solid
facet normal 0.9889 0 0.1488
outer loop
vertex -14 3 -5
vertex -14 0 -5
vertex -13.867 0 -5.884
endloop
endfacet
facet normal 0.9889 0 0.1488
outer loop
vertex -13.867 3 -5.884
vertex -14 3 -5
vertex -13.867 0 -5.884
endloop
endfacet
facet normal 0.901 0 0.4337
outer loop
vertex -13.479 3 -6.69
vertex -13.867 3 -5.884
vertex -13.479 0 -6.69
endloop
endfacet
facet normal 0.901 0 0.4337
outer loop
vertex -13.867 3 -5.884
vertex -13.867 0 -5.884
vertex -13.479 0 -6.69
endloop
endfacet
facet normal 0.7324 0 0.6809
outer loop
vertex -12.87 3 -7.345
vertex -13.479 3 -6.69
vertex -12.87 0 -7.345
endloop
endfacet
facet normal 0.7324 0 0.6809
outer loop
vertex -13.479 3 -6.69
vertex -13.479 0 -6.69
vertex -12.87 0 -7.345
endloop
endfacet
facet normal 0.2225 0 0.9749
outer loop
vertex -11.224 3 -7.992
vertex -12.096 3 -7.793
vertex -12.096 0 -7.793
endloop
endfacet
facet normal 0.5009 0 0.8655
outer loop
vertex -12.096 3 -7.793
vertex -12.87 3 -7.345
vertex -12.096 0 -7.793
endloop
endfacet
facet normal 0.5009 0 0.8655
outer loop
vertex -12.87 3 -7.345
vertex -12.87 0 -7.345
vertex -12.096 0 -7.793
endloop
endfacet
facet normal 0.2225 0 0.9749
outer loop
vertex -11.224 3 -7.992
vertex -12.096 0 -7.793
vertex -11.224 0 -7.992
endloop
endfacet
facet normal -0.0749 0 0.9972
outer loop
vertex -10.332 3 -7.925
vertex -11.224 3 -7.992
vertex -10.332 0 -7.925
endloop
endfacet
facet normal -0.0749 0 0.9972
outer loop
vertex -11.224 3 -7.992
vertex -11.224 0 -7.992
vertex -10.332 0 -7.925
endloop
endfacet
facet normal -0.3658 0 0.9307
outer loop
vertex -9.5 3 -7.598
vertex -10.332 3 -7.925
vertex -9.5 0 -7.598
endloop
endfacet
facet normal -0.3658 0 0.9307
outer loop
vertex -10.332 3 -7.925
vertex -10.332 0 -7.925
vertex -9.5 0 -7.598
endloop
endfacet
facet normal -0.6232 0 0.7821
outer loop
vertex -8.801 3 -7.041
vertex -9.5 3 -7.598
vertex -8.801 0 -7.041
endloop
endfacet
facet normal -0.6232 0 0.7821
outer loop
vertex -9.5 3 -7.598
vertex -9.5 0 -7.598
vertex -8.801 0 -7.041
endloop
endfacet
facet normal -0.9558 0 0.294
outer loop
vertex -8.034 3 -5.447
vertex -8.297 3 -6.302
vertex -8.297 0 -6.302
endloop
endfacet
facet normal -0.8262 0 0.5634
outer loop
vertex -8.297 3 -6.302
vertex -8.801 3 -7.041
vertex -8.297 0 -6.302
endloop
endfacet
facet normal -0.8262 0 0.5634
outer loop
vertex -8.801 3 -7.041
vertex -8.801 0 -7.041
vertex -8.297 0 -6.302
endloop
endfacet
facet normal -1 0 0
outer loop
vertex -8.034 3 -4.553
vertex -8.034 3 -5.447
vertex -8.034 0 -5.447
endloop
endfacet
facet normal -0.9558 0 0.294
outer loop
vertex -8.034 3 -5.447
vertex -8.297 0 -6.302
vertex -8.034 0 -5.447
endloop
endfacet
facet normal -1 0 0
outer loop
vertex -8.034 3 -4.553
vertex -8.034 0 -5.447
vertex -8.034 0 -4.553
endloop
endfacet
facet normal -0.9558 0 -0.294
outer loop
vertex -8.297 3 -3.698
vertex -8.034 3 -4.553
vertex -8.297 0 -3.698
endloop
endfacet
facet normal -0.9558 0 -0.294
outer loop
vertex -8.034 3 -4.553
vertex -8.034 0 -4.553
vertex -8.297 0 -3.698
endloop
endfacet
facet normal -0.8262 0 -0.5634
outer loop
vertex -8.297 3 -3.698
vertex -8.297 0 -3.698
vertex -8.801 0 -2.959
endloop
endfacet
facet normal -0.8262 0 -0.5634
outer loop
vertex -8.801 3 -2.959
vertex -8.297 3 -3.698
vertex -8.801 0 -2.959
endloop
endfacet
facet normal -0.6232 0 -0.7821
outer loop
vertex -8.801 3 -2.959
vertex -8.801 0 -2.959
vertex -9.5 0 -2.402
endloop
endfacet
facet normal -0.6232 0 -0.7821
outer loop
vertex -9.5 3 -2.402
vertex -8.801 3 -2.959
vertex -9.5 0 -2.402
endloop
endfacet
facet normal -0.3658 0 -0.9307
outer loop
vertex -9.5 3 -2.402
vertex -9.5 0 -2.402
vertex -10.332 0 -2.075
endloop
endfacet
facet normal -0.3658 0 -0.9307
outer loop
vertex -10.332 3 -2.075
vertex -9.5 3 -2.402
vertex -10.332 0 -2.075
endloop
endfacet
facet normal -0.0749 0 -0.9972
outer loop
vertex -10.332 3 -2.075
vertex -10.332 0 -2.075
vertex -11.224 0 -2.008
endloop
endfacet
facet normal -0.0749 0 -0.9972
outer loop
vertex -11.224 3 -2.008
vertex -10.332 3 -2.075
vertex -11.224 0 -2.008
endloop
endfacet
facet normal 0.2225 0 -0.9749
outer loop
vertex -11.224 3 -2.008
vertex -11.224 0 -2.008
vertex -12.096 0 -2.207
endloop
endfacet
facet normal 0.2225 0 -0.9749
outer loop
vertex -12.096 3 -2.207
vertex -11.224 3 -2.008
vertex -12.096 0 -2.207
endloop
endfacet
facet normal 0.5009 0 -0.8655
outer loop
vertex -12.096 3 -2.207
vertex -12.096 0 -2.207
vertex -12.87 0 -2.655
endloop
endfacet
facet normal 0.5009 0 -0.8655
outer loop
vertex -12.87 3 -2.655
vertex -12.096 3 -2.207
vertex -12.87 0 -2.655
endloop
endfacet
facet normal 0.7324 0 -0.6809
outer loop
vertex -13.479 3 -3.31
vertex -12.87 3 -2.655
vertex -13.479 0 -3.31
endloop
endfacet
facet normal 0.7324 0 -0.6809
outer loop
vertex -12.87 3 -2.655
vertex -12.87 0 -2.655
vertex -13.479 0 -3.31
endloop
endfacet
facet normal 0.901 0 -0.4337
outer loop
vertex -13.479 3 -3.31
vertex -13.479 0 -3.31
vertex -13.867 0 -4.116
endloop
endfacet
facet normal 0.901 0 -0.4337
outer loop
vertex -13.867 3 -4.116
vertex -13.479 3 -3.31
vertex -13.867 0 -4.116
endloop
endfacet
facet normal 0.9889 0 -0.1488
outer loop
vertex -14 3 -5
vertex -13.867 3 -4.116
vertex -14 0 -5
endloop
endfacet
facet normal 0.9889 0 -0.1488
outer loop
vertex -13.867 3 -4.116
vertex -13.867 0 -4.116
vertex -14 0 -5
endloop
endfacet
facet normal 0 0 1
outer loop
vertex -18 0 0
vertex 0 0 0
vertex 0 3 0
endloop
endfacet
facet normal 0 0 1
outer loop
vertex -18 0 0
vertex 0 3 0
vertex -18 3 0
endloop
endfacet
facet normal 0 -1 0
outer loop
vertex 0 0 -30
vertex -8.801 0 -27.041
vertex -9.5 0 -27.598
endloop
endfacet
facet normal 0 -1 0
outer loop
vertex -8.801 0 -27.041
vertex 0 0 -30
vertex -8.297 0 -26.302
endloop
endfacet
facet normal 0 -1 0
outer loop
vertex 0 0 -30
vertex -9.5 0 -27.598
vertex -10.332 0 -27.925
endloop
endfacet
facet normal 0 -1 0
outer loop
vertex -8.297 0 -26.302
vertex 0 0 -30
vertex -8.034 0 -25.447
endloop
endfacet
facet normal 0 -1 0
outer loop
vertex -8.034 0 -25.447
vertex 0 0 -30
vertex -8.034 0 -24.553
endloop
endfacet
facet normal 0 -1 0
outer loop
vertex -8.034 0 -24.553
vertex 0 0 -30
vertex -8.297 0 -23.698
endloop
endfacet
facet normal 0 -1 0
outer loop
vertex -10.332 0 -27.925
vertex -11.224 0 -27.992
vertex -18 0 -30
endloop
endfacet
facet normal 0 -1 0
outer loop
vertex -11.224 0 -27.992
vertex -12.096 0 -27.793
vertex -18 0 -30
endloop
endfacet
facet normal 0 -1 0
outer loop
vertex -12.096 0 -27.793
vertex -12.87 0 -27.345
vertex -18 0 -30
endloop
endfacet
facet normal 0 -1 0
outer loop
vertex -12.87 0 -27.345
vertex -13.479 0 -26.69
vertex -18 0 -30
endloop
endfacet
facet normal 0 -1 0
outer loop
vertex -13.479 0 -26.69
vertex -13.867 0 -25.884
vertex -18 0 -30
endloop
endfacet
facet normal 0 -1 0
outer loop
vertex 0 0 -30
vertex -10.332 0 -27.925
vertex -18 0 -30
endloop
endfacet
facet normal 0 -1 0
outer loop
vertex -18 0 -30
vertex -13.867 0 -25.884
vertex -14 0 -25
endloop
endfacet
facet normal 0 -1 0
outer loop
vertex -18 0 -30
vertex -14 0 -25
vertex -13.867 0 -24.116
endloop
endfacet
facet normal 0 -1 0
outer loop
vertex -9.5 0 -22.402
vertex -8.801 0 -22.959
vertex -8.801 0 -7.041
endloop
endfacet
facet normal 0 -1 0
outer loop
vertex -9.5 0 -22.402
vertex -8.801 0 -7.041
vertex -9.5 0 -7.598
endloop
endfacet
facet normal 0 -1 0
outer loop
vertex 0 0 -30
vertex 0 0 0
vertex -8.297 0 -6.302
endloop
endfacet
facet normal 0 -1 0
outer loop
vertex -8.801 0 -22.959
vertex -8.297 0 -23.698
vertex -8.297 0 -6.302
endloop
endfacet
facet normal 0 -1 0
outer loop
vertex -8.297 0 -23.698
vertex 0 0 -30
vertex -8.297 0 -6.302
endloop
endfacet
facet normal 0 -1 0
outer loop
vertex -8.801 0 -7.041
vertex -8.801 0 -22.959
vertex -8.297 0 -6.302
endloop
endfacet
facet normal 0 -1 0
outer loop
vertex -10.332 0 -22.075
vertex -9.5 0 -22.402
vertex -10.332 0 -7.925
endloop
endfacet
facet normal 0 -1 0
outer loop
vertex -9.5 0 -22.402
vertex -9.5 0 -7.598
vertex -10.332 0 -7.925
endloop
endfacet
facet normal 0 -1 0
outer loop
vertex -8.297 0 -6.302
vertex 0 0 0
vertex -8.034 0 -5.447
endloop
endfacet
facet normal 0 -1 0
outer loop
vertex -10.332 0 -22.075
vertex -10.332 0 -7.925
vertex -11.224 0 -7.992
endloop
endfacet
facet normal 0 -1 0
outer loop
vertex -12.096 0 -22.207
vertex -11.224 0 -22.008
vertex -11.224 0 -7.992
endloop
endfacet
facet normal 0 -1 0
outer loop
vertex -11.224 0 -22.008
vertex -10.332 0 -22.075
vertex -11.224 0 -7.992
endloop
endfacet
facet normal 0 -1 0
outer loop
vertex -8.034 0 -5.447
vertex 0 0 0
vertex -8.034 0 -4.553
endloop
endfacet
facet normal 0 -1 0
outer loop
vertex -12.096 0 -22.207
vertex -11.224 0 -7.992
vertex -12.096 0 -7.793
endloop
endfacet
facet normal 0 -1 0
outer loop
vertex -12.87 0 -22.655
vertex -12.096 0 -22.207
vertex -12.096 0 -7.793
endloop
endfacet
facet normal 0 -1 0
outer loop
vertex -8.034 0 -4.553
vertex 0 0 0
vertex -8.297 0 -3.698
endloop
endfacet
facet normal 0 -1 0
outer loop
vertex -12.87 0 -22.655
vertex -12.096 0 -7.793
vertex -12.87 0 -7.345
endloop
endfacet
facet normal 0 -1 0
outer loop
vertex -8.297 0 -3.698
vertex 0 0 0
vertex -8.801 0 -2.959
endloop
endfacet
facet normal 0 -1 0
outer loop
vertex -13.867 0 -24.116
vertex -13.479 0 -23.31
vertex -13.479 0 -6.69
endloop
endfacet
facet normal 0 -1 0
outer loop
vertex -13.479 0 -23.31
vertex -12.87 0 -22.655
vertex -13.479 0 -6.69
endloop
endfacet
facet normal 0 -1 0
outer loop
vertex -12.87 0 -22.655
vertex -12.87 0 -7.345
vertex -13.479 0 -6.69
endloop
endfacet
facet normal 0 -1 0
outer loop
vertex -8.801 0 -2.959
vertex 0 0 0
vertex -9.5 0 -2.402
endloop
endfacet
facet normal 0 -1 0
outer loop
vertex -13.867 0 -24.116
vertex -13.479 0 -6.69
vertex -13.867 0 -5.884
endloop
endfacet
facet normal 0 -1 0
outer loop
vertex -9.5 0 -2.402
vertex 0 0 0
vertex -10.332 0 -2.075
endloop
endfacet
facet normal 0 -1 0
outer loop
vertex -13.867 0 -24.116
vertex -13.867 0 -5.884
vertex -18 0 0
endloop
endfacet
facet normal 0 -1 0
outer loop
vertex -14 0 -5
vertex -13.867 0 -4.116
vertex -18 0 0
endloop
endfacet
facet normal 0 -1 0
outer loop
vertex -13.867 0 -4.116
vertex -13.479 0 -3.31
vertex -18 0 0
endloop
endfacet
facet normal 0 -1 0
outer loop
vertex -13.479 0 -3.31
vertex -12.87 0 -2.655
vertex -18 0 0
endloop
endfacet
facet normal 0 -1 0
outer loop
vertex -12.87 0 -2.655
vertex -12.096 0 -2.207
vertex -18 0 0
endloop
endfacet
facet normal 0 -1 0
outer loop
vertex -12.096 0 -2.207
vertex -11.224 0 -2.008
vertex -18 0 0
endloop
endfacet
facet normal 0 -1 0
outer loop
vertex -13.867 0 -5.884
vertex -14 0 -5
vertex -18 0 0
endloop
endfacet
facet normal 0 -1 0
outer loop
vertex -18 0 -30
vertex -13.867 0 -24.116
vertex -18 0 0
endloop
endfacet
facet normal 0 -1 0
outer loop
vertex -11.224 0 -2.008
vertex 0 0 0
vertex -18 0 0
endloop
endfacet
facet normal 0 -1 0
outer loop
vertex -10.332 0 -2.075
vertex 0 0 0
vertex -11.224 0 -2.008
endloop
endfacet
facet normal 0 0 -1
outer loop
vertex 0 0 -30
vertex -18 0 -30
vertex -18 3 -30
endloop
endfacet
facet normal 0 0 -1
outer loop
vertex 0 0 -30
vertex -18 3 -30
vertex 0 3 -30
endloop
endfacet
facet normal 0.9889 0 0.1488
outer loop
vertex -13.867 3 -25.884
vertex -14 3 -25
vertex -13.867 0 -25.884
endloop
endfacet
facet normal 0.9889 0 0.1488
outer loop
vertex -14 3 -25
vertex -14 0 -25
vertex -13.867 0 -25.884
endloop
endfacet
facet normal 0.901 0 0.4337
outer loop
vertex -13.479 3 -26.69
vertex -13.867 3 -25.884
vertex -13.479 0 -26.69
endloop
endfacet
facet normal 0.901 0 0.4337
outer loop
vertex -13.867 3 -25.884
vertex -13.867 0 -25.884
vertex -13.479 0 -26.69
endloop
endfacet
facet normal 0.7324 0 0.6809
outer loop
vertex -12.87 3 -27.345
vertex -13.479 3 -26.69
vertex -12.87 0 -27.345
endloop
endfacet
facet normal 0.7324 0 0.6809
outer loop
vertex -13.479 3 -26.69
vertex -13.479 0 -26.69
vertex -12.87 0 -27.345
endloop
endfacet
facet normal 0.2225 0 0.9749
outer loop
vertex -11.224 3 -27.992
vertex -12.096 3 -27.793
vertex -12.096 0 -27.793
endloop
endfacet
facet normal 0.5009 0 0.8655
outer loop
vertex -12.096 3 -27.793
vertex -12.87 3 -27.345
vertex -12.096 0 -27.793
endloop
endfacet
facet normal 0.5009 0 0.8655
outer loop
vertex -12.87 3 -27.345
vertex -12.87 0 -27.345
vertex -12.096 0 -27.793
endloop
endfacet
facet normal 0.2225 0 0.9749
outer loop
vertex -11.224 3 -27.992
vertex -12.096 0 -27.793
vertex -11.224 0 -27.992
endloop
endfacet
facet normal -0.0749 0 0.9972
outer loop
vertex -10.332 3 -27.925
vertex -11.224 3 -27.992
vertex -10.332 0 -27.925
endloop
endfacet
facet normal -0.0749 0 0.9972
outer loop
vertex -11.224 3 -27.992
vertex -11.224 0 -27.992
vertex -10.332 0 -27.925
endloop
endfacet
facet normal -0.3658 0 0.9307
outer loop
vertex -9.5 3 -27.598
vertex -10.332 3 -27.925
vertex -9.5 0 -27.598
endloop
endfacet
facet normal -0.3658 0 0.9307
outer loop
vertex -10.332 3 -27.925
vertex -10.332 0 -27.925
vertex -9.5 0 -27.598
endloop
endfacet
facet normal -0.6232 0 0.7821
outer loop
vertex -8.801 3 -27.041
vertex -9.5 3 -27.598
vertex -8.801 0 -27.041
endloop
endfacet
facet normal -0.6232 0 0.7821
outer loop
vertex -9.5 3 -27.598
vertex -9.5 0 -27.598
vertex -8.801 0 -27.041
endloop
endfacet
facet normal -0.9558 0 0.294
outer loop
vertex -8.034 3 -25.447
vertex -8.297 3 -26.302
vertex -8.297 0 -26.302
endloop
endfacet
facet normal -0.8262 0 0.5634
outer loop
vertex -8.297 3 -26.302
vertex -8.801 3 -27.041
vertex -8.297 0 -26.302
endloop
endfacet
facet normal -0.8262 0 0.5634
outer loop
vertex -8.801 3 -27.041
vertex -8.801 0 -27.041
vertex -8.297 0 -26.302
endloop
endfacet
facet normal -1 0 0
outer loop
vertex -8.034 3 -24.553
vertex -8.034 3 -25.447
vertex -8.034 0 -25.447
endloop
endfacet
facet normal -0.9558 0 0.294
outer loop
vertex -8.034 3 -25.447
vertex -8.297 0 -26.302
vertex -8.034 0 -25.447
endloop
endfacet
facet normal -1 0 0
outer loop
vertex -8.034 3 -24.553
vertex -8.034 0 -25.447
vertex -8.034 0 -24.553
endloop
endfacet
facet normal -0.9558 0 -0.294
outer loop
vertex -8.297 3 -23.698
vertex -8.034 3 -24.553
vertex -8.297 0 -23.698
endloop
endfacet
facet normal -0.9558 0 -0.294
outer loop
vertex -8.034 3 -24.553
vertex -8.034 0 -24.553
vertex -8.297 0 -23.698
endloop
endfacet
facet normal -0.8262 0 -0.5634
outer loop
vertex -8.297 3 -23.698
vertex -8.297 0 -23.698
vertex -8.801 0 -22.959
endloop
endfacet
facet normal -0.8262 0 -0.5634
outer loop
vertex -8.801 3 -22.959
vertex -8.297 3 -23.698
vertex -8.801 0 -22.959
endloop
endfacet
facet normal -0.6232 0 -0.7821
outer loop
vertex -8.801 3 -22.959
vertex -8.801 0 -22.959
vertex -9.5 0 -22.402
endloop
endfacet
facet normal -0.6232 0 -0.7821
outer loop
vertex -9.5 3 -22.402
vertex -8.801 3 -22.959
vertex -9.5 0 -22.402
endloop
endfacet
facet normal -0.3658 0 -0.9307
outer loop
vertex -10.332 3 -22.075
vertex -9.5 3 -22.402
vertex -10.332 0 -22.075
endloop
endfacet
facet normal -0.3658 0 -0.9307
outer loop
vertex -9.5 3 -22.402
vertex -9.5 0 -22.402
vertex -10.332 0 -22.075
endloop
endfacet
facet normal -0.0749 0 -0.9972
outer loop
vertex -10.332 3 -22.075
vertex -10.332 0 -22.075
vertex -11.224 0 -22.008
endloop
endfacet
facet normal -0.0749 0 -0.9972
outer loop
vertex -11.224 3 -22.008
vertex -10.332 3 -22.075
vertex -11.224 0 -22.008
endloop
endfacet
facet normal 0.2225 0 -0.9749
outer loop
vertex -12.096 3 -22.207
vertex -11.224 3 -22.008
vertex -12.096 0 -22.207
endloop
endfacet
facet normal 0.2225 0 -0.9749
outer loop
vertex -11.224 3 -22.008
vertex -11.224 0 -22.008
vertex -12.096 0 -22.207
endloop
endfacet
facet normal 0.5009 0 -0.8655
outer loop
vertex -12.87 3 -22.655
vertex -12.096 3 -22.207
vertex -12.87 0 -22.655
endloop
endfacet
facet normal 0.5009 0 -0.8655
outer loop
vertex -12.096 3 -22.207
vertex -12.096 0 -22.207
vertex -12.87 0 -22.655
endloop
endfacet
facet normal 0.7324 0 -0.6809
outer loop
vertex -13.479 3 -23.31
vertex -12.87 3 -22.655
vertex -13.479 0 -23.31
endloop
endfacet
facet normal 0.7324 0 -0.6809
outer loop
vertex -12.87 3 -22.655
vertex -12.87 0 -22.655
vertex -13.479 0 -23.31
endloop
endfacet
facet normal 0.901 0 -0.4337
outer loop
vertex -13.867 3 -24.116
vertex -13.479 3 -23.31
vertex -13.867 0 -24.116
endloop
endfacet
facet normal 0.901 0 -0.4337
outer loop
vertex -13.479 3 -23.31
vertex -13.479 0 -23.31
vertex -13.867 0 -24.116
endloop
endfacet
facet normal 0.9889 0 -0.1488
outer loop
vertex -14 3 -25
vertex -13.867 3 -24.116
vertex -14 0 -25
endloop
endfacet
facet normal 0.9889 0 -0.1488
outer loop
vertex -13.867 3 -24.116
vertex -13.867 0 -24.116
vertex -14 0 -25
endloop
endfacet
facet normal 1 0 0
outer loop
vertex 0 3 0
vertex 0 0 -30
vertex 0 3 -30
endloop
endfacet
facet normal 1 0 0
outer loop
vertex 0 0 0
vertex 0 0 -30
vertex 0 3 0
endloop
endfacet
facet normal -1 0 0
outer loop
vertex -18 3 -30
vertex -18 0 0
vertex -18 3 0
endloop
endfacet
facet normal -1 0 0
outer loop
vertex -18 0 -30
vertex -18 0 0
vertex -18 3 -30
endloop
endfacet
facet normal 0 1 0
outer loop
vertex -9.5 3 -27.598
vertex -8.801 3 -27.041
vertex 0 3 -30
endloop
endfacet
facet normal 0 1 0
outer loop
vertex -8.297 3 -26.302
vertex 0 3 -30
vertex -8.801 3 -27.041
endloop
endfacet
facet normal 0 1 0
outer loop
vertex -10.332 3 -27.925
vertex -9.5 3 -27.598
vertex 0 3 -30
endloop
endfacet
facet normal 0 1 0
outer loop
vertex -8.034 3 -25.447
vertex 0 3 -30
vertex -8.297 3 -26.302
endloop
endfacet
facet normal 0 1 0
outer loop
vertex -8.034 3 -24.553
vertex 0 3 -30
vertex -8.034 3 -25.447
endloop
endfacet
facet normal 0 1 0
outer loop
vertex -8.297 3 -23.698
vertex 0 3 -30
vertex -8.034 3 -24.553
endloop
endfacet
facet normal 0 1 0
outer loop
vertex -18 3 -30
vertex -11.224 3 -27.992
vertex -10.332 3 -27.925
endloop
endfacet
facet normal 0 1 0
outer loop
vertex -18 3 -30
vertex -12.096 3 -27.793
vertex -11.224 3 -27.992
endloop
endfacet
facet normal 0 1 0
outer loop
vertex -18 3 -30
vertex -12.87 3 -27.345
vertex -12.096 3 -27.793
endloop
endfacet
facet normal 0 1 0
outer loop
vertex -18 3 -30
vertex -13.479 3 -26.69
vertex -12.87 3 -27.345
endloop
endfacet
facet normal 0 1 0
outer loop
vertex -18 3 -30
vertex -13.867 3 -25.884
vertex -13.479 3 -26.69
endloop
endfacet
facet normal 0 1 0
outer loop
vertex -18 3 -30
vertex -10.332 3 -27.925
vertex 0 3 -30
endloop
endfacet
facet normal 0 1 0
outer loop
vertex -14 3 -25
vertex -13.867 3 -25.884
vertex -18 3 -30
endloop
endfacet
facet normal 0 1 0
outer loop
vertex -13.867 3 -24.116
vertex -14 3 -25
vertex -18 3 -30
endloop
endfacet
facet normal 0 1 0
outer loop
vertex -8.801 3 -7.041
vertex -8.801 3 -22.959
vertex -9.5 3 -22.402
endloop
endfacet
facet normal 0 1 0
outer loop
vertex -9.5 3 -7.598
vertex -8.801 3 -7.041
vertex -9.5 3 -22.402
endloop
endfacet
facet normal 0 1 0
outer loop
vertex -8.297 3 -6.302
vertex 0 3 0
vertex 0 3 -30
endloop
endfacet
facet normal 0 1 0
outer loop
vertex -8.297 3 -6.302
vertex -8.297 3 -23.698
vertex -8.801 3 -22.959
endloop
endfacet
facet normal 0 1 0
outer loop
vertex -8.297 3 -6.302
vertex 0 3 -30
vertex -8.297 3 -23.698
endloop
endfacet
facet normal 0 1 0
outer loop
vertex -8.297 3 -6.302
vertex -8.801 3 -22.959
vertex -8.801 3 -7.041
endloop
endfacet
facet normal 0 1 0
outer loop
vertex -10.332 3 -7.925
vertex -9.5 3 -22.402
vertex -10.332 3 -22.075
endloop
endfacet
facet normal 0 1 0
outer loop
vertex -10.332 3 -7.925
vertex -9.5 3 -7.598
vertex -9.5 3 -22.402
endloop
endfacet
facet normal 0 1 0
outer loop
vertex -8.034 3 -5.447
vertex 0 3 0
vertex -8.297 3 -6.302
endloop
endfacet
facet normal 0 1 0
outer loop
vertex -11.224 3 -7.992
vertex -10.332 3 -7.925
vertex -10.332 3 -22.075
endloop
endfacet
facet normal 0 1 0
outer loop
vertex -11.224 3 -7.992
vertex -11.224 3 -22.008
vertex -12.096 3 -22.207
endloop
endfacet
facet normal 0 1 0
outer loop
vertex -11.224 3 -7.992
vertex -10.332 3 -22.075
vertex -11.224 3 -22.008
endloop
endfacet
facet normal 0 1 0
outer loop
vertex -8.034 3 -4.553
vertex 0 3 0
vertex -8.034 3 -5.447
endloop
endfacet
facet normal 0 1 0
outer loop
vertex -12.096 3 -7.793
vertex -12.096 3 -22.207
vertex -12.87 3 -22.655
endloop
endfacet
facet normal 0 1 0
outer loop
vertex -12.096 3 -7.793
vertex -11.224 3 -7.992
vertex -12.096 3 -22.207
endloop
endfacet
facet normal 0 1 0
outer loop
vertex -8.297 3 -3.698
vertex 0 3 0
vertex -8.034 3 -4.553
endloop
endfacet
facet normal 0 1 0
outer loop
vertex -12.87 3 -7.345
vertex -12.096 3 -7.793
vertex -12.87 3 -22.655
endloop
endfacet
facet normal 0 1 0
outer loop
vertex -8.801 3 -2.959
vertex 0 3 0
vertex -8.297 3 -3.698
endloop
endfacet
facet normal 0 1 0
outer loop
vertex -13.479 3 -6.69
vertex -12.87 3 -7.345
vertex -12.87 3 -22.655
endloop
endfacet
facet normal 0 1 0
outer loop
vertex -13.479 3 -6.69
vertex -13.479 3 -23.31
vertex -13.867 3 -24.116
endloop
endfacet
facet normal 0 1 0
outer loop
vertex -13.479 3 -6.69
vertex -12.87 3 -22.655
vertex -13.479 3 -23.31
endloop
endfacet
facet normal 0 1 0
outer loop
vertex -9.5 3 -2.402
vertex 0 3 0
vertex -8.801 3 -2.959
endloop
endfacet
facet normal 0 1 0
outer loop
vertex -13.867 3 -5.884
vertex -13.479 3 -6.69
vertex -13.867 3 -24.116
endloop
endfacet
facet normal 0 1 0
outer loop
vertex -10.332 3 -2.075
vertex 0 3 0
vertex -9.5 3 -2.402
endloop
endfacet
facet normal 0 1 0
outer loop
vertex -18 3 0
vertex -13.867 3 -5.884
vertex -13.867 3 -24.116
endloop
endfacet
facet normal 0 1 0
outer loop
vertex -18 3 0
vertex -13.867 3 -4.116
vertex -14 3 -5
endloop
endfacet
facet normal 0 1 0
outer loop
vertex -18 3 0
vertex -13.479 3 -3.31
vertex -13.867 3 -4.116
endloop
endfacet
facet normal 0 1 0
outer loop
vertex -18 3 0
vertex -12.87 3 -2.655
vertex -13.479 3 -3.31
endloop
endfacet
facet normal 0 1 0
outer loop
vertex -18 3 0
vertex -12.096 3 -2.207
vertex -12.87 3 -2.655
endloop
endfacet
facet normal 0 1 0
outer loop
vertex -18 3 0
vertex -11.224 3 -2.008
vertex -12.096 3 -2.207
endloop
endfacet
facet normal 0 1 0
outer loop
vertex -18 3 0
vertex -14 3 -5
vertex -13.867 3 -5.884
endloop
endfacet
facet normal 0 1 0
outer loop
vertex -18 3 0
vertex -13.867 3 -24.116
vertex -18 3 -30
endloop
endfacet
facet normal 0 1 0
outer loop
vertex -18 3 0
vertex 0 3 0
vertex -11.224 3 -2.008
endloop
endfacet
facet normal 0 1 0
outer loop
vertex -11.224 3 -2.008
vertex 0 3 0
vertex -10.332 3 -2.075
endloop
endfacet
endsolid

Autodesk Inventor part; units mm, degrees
ref_plane "YZ Plane" through (0, 0, 0) normal (1, 0, 0) x (0, 1, 0)
ref_plane "XZ Plane" through (0, 0, 0) normal (0, 1, 0) x (-1, 0, 0)
ref_plane "XY Plane" through (0, 0, 0) normal (0, 0, 1) x (1, 0, 0)
sketch "Náčrt1" plane through (0, 0, 0) normal (0, 1, 0) x (-1, 0, 0)
  line L0 (0, 0) -> (18, 0)
  line L1 (18, 0) -> (18, -30)
  line L2 (18, -30) -> (0, -30)
  line L3 (0, -30) -> (0, 0)
  circle A0 centre (11, -5) radius 3
  circle A1 centre (11, -25) radius 3
  dimension "d0" = 18
  dimension "d1" = 30
  dimension "d2" = 6
  dimension "d3" = 6
  dimension "d4" = 11
  dimension "d5" = 11
  dimension "d6" = 5
  dimension "d7" = 5
extrude "Vysunutí1" add sketch "Náčrt1" along normal blind 3
equation "\"d5\" = d4"
equation "\"d7\" = d6"
properties part number "prilozka"
